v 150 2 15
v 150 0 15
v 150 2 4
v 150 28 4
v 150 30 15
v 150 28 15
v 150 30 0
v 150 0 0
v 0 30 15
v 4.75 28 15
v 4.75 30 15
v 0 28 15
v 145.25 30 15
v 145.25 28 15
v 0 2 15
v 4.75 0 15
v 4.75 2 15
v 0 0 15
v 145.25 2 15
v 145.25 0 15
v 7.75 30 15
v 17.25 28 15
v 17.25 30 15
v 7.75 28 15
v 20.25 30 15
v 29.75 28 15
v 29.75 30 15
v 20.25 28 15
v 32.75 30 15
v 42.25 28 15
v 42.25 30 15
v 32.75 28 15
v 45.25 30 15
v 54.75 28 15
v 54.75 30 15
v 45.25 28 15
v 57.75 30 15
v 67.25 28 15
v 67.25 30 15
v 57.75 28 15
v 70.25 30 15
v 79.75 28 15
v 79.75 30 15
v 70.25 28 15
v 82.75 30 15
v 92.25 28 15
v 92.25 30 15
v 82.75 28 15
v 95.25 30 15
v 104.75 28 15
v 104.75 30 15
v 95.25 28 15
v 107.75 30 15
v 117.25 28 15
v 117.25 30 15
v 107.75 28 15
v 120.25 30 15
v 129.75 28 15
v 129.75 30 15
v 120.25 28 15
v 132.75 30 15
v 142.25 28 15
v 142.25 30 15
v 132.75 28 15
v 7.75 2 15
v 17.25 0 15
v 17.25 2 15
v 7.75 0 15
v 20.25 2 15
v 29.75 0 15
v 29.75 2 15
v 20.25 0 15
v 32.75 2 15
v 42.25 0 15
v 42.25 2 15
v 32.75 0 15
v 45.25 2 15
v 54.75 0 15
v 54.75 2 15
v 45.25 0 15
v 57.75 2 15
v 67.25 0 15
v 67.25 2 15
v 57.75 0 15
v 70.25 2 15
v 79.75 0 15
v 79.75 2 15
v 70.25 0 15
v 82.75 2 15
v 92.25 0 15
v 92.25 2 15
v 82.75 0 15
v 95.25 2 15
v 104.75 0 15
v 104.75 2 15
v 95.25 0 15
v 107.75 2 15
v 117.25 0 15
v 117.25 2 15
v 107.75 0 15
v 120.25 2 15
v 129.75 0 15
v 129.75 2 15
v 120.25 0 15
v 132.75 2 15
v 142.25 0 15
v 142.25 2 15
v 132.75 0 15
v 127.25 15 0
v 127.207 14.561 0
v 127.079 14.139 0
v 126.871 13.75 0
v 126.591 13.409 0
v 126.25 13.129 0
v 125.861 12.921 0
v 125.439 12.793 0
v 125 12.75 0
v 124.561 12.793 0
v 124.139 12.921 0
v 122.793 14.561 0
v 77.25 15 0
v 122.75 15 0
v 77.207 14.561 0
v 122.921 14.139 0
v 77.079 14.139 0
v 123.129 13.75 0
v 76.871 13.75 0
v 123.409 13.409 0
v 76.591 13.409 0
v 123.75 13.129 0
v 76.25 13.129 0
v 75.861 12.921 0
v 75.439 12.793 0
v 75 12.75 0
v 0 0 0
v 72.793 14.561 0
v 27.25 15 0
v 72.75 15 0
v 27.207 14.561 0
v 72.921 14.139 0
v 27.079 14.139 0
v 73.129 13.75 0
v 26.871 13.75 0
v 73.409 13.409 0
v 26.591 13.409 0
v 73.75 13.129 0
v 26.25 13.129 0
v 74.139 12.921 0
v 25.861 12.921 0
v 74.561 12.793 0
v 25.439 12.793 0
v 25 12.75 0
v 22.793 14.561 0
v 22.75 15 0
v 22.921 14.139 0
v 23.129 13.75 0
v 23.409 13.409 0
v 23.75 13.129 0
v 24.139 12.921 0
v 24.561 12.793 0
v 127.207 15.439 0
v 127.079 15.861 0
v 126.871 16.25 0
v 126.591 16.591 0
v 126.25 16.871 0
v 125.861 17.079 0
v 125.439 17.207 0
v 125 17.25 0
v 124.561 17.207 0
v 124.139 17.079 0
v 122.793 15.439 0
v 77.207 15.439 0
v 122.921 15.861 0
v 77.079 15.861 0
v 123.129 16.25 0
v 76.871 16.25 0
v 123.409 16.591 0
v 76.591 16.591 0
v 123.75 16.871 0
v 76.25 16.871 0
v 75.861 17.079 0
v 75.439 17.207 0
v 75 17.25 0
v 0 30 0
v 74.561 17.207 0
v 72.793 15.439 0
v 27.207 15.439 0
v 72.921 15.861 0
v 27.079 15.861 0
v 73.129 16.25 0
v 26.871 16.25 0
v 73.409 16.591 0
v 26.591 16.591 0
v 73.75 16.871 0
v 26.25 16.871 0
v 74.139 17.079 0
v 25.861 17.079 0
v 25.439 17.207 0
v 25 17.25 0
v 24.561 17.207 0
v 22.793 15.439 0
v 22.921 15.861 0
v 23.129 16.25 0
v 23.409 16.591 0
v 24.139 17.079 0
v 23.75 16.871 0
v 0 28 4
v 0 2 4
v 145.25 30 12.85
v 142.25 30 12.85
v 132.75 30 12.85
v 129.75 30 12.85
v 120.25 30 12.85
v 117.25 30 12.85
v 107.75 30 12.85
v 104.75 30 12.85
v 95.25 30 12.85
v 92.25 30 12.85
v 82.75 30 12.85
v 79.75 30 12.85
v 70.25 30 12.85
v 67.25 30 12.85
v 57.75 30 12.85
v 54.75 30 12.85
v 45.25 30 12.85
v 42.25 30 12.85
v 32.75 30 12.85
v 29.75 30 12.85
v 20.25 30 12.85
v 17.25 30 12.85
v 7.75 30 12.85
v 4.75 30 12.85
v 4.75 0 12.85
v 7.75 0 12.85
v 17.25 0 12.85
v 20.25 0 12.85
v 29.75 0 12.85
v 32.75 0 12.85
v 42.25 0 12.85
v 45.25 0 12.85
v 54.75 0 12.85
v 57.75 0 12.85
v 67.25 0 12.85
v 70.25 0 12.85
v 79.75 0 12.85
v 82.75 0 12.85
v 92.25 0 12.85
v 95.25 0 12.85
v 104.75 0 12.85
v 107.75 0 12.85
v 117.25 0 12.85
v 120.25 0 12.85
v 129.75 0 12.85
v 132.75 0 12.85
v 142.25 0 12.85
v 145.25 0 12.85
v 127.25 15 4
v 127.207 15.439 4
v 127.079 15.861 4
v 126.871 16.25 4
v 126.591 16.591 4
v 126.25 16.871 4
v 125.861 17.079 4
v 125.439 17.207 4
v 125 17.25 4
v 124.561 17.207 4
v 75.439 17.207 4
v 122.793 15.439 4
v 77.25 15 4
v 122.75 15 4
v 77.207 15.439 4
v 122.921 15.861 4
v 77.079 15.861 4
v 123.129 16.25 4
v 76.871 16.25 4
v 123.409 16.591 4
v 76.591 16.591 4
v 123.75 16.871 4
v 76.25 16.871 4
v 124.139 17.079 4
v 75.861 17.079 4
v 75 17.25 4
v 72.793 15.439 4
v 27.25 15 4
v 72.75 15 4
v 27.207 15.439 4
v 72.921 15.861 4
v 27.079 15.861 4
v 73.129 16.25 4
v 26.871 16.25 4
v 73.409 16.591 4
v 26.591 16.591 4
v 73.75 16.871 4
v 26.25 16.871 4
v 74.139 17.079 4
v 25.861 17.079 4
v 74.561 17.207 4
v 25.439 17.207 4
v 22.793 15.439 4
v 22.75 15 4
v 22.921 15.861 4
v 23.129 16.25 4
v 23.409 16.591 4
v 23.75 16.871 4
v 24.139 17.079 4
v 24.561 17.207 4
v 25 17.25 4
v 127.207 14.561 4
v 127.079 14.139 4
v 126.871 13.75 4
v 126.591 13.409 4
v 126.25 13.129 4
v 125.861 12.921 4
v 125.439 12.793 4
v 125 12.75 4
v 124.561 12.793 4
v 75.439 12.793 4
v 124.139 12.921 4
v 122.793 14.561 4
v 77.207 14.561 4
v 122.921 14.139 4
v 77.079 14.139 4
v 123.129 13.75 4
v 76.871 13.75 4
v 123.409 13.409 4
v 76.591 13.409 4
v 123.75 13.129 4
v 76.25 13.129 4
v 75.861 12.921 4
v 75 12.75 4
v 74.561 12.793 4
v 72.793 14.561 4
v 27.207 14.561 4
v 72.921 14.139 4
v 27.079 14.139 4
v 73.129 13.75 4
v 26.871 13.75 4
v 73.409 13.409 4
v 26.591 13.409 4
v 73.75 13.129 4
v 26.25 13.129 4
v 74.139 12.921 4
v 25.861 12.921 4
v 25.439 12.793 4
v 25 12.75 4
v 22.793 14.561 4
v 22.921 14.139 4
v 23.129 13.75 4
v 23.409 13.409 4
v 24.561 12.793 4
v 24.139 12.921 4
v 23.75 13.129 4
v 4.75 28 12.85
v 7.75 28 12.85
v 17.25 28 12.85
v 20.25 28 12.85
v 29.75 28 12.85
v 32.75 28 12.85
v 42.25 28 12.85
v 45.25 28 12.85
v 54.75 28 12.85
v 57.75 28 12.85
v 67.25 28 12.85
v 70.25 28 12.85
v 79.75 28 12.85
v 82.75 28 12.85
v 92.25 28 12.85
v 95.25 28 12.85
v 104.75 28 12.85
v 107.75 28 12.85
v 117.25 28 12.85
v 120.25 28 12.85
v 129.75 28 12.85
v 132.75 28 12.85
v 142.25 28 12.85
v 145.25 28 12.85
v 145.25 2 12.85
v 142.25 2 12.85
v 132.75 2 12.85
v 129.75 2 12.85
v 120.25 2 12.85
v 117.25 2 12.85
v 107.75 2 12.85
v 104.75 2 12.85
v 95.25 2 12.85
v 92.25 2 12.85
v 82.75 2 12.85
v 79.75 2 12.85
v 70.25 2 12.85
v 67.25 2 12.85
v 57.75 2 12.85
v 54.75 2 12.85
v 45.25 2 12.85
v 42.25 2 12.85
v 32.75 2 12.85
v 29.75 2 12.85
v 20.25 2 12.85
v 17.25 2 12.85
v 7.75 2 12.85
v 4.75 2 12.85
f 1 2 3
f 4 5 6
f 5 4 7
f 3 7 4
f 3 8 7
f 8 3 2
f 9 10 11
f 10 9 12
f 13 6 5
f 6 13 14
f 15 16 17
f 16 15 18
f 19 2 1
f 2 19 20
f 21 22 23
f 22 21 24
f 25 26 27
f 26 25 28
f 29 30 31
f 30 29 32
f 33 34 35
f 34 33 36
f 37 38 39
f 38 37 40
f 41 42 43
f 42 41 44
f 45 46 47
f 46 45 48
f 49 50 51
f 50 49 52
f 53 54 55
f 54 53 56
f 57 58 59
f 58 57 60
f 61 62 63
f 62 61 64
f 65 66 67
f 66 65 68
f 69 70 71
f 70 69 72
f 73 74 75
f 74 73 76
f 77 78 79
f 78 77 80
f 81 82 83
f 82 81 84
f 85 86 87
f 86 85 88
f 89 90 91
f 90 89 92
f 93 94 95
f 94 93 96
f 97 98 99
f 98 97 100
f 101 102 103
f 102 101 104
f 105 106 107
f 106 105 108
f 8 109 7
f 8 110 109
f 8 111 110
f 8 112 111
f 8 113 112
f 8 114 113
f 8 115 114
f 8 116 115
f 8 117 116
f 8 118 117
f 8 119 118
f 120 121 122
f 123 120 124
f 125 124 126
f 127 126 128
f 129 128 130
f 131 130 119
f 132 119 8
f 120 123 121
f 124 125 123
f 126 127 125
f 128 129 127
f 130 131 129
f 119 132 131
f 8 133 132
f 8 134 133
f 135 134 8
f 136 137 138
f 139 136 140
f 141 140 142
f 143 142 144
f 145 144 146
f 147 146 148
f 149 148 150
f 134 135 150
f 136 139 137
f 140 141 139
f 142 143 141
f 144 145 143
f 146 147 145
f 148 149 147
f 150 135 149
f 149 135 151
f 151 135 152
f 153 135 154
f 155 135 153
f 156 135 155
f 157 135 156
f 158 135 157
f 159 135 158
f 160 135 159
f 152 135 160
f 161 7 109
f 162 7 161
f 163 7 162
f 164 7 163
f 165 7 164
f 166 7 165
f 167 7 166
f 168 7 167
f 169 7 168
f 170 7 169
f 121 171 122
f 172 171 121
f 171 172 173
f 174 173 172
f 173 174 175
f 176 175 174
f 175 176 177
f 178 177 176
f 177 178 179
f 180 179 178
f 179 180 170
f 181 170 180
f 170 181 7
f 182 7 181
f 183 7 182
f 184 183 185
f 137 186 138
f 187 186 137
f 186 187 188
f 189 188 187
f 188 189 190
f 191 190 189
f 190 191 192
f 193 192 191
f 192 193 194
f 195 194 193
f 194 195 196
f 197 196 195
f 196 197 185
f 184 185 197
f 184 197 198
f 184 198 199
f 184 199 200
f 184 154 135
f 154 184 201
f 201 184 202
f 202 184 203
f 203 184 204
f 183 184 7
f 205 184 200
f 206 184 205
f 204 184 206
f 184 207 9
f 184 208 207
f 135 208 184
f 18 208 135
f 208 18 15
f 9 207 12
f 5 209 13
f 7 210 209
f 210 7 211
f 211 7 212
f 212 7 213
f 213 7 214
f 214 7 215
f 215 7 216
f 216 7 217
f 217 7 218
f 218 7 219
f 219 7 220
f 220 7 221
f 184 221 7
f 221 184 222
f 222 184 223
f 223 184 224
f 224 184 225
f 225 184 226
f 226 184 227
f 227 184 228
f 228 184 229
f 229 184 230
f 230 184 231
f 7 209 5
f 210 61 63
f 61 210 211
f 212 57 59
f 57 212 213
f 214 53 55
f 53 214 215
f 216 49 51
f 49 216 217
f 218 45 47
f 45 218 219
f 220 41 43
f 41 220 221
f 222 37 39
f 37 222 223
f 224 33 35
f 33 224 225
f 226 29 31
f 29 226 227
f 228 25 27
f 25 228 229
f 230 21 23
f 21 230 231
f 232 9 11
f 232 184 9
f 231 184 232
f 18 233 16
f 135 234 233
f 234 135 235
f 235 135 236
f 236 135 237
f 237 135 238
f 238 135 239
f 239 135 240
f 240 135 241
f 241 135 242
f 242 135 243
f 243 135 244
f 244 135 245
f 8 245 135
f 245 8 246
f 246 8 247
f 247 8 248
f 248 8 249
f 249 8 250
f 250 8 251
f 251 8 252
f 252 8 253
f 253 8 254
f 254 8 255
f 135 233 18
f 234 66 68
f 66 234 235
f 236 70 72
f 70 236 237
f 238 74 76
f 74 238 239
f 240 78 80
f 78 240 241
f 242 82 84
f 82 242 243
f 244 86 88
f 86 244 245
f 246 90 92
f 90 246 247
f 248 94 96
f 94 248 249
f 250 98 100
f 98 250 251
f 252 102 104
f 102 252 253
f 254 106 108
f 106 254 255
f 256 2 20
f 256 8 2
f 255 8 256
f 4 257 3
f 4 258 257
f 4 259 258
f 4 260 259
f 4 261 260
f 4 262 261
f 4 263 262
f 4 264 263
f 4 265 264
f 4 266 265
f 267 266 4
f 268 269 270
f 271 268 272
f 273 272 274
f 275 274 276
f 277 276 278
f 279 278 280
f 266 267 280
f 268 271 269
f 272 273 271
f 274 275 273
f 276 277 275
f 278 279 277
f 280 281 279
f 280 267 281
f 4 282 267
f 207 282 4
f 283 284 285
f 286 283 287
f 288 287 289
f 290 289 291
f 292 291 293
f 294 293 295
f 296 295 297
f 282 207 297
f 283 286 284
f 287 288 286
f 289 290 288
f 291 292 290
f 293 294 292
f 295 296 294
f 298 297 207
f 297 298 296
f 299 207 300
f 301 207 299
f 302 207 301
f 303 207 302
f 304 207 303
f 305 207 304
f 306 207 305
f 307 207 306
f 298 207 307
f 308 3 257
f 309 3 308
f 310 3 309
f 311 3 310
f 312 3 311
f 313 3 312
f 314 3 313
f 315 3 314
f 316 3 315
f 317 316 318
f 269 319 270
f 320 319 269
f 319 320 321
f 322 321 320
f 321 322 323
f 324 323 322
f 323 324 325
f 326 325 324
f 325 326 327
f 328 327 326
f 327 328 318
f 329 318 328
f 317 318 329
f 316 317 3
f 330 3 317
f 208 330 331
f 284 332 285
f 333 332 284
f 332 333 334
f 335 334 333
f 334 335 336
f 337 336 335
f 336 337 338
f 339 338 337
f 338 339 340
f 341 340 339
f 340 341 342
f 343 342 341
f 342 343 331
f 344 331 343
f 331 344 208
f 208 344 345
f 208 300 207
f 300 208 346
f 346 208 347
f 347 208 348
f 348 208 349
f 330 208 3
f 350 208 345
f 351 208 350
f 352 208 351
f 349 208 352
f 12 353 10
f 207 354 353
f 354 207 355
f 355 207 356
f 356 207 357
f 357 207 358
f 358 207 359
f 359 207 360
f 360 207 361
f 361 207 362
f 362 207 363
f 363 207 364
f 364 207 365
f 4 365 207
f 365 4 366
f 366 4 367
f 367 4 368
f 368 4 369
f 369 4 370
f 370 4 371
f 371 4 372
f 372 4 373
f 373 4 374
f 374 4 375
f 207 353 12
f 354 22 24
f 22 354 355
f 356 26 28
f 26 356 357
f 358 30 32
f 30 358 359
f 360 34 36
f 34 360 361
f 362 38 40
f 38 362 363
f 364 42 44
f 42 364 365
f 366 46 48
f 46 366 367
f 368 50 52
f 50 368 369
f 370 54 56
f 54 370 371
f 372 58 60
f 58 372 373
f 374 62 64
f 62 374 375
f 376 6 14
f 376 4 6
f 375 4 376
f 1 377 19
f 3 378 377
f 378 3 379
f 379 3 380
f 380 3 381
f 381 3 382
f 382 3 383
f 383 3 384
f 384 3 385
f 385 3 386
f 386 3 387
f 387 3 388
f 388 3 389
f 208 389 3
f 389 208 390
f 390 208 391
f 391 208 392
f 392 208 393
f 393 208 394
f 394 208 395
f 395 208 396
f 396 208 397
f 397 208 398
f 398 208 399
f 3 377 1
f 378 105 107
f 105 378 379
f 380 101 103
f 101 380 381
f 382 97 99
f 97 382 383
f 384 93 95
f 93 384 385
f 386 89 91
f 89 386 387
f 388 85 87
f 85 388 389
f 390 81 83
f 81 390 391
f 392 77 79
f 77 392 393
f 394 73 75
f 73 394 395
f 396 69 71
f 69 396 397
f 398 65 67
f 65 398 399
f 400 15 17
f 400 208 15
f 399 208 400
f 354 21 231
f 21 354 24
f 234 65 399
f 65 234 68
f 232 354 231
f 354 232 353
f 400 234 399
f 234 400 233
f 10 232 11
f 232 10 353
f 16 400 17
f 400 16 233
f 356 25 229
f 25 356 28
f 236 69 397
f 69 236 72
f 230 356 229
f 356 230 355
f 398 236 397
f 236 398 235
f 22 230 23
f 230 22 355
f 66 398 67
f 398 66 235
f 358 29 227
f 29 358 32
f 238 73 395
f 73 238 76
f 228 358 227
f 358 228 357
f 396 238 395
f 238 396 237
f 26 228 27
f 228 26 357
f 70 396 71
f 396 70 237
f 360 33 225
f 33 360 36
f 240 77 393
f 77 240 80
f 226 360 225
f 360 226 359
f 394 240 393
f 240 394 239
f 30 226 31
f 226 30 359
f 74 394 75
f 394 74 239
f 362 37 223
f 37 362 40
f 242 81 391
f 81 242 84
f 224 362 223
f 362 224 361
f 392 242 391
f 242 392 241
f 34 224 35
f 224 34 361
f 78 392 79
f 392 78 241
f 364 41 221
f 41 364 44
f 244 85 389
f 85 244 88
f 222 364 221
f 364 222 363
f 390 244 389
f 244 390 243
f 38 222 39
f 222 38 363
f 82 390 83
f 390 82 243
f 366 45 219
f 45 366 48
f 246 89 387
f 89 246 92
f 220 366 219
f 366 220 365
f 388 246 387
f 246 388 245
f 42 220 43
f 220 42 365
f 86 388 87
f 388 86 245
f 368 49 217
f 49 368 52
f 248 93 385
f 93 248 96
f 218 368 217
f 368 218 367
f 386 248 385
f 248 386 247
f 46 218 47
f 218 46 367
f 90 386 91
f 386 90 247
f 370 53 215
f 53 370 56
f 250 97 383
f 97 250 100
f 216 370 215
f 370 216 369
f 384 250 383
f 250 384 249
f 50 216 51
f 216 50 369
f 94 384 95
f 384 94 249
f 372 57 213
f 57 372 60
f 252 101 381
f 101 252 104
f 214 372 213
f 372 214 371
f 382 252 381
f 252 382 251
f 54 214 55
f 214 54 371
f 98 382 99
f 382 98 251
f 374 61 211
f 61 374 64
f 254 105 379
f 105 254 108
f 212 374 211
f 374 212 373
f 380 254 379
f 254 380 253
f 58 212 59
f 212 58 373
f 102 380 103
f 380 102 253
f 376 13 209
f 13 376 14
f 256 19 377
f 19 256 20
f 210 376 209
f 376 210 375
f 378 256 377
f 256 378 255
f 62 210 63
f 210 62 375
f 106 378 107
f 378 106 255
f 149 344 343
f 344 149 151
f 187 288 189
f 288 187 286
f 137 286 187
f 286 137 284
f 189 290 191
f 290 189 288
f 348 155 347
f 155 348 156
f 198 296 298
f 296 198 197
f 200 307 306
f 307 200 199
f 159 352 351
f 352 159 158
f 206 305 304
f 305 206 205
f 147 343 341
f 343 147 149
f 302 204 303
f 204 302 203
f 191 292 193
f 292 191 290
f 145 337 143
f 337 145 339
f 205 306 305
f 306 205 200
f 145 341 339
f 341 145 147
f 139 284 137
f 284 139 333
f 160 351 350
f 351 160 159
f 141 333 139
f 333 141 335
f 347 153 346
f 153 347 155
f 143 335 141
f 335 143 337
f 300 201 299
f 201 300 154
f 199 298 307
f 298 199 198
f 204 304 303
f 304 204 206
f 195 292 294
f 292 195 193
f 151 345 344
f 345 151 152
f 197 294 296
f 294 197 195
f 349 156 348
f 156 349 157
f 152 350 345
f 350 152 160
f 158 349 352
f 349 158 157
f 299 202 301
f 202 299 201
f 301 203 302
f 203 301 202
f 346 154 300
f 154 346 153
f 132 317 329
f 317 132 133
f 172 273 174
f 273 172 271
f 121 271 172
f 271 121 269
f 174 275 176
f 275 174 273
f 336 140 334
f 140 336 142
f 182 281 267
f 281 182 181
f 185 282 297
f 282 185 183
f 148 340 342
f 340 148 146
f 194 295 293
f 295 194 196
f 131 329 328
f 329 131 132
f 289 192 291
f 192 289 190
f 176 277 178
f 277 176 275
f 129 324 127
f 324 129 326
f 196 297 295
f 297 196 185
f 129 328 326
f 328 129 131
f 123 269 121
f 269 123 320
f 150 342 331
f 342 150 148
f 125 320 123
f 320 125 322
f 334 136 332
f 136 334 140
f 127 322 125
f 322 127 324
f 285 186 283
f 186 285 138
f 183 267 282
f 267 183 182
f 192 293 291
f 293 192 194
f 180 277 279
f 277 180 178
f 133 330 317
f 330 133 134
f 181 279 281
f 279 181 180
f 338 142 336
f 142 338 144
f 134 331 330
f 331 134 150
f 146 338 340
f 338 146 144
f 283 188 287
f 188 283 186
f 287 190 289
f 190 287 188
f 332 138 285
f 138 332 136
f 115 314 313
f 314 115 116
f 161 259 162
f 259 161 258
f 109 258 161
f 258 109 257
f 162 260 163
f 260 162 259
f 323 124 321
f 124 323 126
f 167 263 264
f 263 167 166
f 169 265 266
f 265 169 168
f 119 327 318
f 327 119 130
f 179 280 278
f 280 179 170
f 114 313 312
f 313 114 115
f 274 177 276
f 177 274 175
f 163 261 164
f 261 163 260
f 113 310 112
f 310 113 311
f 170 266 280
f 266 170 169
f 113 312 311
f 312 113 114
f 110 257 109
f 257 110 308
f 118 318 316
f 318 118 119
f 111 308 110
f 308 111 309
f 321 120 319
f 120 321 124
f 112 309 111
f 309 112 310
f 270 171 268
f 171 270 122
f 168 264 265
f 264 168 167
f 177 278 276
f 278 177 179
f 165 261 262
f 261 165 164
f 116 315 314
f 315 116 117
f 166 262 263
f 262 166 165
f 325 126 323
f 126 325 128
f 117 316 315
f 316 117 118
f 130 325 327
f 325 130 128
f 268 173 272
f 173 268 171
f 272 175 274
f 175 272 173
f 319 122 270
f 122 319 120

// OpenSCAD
$fn = 32;

// ----------------------------------------------------------------------
// Cable duct: 150 x 30 x 15 mm, 12 fingers
// ----------------------------------------------------------------------

// --- parameters (mm) ---
channel_l = 150;          // duct length, X
channel_w = 30;           // duct width, Y
channel_h = 15;           // duct height, Z
channel_t = 2;            // side wall thickness
floor_t = 4;              // floor thickness
slot_w = 3;               // finger slot width
slot_h = 8.85;            // finger slot height
fingers = 12;             // number of finger slots per side
pitch = 12.5;             // finger pitch
hole_d = 4.5;             // floor mounting hole
hole_n = 3;               // mounting holes in the floor

module shell() {
  difference() {
    cube([channel_l, channel_w, channel_h]);
    /* open top channel */
    translate([-channel_t - 1, channel_t, floor_t])
      cube([channel_l + 2 * channel_t + 2, channel_w - 2 * channel_t, channel_h + 1]);
  }
}

difference() {
  union() {
    shell();
  }
  /* finger slots cut through both side walls */
  for (i = [0 : fingers - 1]) translate([pitch / 2 + i * pitch - slot_w / 2, -1, floor_t + slot_h]) cube([slot_w, channel_w + 2, channel_h]);
  for (i = [0 : hole_n - 1]) translate([(channel_l / hole_n) * (i + 0.5), channel_w / 2, -1]) cylinder(h = floor_t + 2, d = hole_d);
}
